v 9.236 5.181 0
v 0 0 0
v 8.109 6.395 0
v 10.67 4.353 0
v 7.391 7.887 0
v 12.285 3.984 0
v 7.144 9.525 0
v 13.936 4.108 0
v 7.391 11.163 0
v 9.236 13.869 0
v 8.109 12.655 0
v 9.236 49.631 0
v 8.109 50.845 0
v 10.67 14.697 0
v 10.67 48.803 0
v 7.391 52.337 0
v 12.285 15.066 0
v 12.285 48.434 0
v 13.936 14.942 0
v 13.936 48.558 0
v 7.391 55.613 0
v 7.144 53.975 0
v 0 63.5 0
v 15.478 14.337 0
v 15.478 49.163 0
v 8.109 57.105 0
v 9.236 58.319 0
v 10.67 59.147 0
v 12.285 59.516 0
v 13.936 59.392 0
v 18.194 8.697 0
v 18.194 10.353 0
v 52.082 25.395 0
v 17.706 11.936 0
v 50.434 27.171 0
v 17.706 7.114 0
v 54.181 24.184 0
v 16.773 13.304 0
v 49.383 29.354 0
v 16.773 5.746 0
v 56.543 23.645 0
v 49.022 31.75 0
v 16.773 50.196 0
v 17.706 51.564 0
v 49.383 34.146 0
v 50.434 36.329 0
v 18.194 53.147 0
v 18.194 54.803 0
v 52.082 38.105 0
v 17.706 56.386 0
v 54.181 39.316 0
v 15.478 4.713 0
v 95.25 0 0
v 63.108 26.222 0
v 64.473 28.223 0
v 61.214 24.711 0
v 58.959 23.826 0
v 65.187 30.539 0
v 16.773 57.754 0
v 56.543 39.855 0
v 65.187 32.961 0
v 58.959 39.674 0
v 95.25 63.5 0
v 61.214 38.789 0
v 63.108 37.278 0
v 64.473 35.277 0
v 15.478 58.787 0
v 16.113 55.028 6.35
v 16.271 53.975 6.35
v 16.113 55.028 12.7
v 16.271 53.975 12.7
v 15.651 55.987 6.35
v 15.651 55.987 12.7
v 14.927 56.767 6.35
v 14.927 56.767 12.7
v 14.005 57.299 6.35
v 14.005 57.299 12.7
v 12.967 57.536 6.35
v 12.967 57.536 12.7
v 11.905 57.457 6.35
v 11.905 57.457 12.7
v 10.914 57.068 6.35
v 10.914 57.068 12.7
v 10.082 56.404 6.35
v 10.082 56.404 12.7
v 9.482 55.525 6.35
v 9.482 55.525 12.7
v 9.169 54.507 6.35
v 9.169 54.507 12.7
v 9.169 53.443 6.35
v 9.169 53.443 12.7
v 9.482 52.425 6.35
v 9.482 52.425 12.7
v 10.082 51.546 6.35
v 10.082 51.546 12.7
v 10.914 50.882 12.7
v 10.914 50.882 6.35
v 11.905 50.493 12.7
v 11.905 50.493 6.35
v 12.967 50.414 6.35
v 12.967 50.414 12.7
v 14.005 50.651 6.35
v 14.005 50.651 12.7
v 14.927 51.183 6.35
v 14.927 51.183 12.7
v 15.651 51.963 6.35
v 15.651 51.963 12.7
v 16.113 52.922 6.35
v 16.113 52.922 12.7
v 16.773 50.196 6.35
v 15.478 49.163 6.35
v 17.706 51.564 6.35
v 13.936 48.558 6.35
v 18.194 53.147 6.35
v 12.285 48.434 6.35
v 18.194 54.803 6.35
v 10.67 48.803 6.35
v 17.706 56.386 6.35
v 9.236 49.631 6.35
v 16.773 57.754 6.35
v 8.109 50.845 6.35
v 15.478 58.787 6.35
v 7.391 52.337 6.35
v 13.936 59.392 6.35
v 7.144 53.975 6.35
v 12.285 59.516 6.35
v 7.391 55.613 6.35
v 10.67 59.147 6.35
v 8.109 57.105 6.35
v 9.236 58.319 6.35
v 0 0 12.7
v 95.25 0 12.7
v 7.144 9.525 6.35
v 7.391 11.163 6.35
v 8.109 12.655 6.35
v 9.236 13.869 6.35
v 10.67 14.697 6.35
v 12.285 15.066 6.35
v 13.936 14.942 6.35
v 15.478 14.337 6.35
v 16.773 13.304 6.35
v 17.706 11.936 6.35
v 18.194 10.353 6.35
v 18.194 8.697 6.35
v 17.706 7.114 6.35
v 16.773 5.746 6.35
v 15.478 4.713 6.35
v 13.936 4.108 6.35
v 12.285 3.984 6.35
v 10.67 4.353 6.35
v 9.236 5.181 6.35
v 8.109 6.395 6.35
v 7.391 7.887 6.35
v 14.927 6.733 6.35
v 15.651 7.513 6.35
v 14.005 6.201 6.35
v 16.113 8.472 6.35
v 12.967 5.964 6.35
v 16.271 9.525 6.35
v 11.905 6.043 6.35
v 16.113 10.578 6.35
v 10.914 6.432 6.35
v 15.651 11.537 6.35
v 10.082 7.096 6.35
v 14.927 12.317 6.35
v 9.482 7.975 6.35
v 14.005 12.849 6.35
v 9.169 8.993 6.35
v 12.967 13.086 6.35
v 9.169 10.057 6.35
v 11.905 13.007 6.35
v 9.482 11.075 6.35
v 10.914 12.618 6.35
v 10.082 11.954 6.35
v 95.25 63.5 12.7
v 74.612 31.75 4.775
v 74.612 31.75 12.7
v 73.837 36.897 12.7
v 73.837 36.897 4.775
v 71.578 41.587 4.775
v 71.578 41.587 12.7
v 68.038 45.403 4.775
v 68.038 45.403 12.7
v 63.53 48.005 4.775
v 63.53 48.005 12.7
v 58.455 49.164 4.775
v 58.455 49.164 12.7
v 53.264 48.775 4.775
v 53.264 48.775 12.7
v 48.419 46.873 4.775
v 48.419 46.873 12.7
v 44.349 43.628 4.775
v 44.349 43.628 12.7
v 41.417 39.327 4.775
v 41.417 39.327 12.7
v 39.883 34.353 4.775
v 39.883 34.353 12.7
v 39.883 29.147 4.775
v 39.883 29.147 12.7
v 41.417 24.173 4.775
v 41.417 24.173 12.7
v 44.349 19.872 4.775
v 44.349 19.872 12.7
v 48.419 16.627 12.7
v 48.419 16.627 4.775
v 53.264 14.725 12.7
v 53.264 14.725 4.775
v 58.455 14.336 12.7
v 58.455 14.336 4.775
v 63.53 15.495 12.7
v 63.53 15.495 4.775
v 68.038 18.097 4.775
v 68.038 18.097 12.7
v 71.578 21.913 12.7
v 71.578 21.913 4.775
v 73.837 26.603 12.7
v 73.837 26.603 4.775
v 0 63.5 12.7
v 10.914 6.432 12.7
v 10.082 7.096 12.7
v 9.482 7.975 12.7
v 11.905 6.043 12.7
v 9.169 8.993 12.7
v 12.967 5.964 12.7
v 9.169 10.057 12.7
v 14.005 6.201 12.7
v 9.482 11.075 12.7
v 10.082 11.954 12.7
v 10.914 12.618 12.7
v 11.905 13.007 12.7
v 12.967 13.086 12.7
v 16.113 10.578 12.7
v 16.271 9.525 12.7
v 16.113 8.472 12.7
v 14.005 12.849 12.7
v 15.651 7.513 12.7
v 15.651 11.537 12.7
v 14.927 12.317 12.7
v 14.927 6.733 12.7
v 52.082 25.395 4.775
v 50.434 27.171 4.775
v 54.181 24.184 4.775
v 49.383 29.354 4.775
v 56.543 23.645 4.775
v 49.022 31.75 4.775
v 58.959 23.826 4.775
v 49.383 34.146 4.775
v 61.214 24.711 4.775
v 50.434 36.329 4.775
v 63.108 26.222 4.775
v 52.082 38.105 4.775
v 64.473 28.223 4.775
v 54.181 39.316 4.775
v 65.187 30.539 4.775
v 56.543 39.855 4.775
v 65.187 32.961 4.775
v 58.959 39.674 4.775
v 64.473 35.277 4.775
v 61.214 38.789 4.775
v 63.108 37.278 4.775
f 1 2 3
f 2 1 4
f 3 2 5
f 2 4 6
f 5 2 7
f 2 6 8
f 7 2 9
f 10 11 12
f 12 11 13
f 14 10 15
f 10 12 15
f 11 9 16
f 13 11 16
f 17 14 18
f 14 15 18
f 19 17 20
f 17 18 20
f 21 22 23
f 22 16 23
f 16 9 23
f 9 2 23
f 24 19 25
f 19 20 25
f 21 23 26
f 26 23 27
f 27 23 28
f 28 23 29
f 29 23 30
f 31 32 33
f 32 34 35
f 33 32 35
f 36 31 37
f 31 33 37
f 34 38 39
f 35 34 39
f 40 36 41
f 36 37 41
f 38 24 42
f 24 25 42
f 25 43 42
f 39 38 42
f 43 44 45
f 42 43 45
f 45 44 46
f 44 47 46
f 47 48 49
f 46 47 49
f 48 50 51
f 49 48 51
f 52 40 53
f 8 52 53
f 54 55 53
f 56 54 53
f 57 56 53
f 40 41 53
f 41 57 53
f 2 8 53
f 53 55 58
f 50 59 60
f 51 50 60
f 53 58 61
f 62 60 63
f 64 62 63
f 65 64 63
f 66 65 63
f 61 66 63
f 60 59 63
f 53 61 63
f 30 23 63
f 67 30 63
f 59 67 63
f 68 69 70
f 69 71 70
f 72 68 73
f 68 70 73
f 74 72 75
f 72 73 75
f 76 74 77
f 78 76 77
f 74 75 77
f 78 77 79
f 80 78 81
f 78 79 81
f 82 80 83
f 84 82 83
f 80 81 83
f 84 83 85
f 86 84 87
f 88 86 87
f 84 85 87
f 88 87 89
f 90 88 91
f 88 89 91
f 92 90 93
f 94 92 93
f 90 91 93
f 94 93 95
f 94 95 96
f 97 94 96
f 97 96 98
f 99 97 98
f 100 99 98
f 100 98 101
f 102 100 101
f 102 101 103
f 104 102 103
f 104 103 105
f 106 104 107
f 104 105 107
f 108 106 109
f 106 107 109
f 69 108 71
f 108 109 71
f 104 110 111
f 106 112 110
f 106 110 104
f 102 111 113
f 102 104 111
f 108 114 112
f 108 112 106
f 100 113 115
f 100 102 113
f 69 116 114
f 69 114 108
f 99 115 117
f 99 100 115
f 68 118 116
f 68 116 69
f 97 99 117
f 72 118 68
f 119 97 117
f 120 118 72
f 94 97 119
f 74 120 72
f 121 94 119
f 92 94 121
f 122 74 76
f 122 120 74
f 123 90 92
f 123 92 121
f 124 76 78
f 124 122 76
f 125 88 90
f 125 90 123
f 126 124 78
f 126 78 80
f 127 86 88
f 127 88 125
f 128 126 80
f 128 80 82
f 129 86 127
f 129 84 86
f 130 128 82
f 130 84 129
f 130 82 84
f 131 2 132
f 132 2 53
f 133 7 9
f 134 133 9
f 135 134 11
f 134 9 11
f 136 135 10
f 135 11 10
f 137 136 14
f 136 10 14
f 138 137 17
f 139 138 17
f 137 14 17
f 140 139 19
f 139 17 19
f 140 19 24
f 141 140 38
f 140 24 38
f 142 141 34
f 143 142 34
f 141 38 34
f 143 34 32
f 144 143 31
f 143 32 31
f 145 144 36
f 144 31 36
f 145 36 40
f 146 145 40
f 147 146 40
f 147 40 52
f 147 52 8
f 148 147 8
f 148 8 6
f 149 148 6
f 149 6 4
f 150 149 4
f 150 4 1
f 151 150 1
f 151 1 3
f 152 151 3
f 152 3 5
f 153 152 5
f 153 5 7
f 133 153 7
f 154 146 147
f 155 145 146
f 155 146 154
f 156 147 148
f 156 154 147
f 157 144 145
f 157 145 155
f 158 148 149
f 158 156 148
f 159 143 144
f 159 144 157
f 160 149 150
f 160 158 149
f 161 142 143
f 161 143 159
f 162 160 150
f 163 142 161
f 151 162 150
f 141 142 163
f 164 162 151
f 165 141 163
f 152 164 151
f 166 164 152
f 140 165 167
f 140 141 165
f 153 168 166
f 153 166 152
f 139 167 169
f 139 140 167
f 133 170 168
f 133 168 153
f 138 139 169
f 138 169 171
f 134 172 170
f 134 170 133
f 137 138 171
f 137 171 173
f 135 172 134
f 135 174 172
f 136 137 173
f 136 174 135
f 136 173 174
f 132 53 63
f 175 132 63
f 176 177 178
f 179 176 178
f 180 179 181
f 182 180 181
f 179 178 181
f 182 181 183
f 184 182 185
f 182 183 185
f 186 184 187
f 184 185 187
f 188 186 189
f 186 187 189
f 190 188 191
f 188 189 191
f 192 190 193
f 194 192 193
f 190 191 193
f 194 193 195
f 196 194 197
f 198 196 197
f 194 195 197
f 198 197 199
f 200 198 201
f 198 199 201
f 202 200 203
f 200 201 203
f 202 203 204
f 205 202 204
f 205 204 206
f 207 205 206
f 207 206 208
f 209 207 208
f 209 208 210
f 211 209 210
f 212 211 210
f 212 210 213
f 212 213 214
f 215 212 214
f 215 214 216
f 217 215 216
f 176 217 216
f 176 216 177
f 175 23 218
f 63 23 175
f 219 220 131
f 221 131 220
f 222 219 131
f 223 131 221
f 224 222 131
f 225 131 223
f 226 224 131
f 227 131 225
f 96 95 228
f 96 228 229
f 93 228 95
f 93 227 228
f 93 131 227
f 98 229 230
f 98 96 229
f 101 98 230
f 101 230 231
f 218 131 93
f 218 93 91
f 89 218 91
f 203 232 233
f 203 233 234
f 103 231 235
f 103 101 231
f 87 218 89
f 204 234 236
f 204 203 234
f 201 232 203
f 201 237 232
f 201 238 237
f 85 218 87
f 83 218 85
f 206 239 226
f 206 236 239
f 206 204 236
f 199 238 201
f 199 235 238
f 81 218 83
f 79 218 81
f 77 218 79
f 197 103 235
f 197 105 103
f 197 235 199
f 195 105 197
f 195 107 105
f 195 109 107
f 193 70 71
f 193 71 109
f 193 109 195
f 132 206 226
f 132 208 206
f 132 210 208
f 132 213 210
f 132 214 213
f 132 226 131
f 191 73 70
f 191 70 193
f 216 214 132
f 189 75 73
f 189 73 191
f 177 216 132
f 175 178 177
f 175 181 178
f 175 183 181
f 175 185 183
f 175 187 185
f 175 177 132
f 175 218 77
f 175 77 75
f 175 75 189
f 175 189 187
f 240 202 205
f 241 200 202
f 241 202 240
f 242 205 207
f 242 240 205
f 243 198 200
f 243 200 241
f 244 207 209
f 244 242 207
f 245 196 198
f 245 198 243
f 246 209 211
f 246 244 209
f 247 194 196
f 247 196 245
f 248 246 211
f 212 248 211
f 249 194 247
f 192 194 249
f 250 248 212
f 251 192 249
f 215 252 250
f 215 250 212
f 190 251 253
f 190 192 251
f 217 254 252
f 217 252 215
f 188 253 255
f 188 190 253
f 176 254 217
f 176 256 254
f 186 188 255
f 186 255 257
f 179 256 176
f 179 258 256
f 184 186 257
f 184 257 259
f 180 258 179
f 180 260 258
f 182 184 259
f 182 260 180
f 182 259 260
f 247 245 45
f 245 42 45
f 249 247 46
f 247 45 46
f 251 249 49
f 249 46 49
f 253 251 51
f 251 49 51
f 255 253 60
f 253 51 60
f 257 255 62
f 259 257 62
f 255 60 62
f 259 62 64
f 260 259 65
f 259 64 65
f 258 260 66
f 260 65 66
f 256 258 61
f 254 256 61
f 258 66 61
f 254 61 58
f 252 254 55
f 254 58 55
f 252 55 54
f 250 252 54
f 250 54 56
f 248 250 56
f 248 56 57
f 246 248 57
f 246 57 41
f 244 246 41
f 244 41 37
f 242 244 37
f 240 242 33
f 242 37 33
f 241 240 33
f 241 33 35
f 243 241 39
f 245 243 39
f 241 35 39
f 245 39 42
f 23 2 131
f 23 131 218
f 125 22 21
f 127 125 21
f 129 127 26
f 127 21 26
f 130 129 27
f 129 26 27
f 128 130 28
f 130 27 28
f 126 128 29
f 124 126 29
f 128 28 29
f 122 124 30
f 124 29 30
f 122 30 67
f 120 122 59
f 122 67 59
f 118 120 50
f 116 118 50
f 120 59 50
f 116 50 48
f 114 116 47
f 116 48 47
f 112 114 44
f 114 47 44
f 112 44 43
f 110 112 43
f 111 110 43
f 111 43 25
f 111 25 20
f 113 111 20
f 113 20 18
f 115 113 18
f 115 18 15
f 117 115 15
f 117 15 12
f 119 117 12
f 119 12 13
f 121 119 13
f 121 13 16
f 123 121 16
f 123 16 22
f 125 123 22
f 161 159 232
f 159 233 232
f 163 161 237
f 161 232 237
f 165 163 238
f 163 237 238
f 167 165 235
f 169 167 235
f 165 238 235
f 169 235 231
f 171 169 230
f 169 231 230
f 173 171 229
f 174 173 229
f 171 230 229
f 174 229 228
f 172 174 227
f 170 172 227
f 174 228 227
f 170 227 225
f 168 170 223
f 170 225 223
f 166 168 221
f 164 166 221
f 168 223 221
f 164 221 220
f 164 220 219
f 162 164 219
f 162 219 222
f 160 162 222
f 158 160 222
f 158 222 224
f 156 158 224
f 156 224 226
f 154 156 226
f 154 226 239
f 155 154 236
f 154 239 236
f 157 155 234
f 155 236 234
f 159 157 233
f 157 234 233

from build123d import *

# Parameters (mm, degrees)
SKETCH1_W                                        = 95.25
SKETCH1_H                                        = 63.5
BOSS_EXTRUDE1_DEPTH                              = 12.7
CBORE_FOR_1_4_SOCKET_HEAD_CAP_SCREW1_D           = 7.14248
CBORE_FOR_1_4_SOCKET_HEAD_CAP_SCREW1_CBORE_D     = 11.1125
CBORE_FOR_1_4_SOCKET_HEAD_CAP_SCREW1_CBORE_DEPTH = 6.35
CBORE_FOR_5_8_SOCKET_HEAD_CAP_SCREW1_D           = 16.256
CBORE_FOR_5_8_SOCKET_HEAD_CAP_SCREW1_CBORE_D     = 34.925
CBORE_FOR_5_8_SOCKET_HEAD_CAP_SCREW1_CBORE_DEPTH = 7.9248


with BuildPart() as part:
    # Sketch1 → Boss-Extrude1 (new body)
    with BuildSketch(Plane.XY):
        with Locations((47.625, 31.75)):
            Rectangle(SKETCH1_W, SKETCH1_H)
    extrude(amount=BOSS_EXTRUDE1_DEPTH)

    # CBORE for 1/4 Socket Head Cap Screw1 (through all)
    with Locations(Plane(origin=(0, 0, 0), x_dir=(-1, 0, 0), z_dir=(0, 0, -1))):
        with Locations((-12.7, 53.975), (-12.7, 9.525)):
            CounterBoreHole(CBORE_FOR_1_4_SOCKET_HEAD_CAP_SCREW1_D / 2, CBORE_FOR_1_4_SOCKET_HEAD_CAP_SCREW1_CBORE_D / 2, CBORE_FOR_1_4_SOCKET_HEAD_CAP_SCREW1_CBORE_DEPTH)

    # CBORE for 5/8 Socket Head Cap Screw1 (through all)
    with Locations(Plane.XY.offset(12.7)):
        with Locations((57.15, 31.75)):
            CounterBoreHole(CBORE_FOR_5_8_SOCKET_HEAD_CAP_SCREW1_D / 2, CBORE_FOR_5_8_SOCKET_HEAD_CAP_SCREW1_CBORE_D / 2, CBORE_FOR_5_8_SOCKET_HEAD_CAP_SCREW1_CBORE_DEPTH)


solid = part.part
